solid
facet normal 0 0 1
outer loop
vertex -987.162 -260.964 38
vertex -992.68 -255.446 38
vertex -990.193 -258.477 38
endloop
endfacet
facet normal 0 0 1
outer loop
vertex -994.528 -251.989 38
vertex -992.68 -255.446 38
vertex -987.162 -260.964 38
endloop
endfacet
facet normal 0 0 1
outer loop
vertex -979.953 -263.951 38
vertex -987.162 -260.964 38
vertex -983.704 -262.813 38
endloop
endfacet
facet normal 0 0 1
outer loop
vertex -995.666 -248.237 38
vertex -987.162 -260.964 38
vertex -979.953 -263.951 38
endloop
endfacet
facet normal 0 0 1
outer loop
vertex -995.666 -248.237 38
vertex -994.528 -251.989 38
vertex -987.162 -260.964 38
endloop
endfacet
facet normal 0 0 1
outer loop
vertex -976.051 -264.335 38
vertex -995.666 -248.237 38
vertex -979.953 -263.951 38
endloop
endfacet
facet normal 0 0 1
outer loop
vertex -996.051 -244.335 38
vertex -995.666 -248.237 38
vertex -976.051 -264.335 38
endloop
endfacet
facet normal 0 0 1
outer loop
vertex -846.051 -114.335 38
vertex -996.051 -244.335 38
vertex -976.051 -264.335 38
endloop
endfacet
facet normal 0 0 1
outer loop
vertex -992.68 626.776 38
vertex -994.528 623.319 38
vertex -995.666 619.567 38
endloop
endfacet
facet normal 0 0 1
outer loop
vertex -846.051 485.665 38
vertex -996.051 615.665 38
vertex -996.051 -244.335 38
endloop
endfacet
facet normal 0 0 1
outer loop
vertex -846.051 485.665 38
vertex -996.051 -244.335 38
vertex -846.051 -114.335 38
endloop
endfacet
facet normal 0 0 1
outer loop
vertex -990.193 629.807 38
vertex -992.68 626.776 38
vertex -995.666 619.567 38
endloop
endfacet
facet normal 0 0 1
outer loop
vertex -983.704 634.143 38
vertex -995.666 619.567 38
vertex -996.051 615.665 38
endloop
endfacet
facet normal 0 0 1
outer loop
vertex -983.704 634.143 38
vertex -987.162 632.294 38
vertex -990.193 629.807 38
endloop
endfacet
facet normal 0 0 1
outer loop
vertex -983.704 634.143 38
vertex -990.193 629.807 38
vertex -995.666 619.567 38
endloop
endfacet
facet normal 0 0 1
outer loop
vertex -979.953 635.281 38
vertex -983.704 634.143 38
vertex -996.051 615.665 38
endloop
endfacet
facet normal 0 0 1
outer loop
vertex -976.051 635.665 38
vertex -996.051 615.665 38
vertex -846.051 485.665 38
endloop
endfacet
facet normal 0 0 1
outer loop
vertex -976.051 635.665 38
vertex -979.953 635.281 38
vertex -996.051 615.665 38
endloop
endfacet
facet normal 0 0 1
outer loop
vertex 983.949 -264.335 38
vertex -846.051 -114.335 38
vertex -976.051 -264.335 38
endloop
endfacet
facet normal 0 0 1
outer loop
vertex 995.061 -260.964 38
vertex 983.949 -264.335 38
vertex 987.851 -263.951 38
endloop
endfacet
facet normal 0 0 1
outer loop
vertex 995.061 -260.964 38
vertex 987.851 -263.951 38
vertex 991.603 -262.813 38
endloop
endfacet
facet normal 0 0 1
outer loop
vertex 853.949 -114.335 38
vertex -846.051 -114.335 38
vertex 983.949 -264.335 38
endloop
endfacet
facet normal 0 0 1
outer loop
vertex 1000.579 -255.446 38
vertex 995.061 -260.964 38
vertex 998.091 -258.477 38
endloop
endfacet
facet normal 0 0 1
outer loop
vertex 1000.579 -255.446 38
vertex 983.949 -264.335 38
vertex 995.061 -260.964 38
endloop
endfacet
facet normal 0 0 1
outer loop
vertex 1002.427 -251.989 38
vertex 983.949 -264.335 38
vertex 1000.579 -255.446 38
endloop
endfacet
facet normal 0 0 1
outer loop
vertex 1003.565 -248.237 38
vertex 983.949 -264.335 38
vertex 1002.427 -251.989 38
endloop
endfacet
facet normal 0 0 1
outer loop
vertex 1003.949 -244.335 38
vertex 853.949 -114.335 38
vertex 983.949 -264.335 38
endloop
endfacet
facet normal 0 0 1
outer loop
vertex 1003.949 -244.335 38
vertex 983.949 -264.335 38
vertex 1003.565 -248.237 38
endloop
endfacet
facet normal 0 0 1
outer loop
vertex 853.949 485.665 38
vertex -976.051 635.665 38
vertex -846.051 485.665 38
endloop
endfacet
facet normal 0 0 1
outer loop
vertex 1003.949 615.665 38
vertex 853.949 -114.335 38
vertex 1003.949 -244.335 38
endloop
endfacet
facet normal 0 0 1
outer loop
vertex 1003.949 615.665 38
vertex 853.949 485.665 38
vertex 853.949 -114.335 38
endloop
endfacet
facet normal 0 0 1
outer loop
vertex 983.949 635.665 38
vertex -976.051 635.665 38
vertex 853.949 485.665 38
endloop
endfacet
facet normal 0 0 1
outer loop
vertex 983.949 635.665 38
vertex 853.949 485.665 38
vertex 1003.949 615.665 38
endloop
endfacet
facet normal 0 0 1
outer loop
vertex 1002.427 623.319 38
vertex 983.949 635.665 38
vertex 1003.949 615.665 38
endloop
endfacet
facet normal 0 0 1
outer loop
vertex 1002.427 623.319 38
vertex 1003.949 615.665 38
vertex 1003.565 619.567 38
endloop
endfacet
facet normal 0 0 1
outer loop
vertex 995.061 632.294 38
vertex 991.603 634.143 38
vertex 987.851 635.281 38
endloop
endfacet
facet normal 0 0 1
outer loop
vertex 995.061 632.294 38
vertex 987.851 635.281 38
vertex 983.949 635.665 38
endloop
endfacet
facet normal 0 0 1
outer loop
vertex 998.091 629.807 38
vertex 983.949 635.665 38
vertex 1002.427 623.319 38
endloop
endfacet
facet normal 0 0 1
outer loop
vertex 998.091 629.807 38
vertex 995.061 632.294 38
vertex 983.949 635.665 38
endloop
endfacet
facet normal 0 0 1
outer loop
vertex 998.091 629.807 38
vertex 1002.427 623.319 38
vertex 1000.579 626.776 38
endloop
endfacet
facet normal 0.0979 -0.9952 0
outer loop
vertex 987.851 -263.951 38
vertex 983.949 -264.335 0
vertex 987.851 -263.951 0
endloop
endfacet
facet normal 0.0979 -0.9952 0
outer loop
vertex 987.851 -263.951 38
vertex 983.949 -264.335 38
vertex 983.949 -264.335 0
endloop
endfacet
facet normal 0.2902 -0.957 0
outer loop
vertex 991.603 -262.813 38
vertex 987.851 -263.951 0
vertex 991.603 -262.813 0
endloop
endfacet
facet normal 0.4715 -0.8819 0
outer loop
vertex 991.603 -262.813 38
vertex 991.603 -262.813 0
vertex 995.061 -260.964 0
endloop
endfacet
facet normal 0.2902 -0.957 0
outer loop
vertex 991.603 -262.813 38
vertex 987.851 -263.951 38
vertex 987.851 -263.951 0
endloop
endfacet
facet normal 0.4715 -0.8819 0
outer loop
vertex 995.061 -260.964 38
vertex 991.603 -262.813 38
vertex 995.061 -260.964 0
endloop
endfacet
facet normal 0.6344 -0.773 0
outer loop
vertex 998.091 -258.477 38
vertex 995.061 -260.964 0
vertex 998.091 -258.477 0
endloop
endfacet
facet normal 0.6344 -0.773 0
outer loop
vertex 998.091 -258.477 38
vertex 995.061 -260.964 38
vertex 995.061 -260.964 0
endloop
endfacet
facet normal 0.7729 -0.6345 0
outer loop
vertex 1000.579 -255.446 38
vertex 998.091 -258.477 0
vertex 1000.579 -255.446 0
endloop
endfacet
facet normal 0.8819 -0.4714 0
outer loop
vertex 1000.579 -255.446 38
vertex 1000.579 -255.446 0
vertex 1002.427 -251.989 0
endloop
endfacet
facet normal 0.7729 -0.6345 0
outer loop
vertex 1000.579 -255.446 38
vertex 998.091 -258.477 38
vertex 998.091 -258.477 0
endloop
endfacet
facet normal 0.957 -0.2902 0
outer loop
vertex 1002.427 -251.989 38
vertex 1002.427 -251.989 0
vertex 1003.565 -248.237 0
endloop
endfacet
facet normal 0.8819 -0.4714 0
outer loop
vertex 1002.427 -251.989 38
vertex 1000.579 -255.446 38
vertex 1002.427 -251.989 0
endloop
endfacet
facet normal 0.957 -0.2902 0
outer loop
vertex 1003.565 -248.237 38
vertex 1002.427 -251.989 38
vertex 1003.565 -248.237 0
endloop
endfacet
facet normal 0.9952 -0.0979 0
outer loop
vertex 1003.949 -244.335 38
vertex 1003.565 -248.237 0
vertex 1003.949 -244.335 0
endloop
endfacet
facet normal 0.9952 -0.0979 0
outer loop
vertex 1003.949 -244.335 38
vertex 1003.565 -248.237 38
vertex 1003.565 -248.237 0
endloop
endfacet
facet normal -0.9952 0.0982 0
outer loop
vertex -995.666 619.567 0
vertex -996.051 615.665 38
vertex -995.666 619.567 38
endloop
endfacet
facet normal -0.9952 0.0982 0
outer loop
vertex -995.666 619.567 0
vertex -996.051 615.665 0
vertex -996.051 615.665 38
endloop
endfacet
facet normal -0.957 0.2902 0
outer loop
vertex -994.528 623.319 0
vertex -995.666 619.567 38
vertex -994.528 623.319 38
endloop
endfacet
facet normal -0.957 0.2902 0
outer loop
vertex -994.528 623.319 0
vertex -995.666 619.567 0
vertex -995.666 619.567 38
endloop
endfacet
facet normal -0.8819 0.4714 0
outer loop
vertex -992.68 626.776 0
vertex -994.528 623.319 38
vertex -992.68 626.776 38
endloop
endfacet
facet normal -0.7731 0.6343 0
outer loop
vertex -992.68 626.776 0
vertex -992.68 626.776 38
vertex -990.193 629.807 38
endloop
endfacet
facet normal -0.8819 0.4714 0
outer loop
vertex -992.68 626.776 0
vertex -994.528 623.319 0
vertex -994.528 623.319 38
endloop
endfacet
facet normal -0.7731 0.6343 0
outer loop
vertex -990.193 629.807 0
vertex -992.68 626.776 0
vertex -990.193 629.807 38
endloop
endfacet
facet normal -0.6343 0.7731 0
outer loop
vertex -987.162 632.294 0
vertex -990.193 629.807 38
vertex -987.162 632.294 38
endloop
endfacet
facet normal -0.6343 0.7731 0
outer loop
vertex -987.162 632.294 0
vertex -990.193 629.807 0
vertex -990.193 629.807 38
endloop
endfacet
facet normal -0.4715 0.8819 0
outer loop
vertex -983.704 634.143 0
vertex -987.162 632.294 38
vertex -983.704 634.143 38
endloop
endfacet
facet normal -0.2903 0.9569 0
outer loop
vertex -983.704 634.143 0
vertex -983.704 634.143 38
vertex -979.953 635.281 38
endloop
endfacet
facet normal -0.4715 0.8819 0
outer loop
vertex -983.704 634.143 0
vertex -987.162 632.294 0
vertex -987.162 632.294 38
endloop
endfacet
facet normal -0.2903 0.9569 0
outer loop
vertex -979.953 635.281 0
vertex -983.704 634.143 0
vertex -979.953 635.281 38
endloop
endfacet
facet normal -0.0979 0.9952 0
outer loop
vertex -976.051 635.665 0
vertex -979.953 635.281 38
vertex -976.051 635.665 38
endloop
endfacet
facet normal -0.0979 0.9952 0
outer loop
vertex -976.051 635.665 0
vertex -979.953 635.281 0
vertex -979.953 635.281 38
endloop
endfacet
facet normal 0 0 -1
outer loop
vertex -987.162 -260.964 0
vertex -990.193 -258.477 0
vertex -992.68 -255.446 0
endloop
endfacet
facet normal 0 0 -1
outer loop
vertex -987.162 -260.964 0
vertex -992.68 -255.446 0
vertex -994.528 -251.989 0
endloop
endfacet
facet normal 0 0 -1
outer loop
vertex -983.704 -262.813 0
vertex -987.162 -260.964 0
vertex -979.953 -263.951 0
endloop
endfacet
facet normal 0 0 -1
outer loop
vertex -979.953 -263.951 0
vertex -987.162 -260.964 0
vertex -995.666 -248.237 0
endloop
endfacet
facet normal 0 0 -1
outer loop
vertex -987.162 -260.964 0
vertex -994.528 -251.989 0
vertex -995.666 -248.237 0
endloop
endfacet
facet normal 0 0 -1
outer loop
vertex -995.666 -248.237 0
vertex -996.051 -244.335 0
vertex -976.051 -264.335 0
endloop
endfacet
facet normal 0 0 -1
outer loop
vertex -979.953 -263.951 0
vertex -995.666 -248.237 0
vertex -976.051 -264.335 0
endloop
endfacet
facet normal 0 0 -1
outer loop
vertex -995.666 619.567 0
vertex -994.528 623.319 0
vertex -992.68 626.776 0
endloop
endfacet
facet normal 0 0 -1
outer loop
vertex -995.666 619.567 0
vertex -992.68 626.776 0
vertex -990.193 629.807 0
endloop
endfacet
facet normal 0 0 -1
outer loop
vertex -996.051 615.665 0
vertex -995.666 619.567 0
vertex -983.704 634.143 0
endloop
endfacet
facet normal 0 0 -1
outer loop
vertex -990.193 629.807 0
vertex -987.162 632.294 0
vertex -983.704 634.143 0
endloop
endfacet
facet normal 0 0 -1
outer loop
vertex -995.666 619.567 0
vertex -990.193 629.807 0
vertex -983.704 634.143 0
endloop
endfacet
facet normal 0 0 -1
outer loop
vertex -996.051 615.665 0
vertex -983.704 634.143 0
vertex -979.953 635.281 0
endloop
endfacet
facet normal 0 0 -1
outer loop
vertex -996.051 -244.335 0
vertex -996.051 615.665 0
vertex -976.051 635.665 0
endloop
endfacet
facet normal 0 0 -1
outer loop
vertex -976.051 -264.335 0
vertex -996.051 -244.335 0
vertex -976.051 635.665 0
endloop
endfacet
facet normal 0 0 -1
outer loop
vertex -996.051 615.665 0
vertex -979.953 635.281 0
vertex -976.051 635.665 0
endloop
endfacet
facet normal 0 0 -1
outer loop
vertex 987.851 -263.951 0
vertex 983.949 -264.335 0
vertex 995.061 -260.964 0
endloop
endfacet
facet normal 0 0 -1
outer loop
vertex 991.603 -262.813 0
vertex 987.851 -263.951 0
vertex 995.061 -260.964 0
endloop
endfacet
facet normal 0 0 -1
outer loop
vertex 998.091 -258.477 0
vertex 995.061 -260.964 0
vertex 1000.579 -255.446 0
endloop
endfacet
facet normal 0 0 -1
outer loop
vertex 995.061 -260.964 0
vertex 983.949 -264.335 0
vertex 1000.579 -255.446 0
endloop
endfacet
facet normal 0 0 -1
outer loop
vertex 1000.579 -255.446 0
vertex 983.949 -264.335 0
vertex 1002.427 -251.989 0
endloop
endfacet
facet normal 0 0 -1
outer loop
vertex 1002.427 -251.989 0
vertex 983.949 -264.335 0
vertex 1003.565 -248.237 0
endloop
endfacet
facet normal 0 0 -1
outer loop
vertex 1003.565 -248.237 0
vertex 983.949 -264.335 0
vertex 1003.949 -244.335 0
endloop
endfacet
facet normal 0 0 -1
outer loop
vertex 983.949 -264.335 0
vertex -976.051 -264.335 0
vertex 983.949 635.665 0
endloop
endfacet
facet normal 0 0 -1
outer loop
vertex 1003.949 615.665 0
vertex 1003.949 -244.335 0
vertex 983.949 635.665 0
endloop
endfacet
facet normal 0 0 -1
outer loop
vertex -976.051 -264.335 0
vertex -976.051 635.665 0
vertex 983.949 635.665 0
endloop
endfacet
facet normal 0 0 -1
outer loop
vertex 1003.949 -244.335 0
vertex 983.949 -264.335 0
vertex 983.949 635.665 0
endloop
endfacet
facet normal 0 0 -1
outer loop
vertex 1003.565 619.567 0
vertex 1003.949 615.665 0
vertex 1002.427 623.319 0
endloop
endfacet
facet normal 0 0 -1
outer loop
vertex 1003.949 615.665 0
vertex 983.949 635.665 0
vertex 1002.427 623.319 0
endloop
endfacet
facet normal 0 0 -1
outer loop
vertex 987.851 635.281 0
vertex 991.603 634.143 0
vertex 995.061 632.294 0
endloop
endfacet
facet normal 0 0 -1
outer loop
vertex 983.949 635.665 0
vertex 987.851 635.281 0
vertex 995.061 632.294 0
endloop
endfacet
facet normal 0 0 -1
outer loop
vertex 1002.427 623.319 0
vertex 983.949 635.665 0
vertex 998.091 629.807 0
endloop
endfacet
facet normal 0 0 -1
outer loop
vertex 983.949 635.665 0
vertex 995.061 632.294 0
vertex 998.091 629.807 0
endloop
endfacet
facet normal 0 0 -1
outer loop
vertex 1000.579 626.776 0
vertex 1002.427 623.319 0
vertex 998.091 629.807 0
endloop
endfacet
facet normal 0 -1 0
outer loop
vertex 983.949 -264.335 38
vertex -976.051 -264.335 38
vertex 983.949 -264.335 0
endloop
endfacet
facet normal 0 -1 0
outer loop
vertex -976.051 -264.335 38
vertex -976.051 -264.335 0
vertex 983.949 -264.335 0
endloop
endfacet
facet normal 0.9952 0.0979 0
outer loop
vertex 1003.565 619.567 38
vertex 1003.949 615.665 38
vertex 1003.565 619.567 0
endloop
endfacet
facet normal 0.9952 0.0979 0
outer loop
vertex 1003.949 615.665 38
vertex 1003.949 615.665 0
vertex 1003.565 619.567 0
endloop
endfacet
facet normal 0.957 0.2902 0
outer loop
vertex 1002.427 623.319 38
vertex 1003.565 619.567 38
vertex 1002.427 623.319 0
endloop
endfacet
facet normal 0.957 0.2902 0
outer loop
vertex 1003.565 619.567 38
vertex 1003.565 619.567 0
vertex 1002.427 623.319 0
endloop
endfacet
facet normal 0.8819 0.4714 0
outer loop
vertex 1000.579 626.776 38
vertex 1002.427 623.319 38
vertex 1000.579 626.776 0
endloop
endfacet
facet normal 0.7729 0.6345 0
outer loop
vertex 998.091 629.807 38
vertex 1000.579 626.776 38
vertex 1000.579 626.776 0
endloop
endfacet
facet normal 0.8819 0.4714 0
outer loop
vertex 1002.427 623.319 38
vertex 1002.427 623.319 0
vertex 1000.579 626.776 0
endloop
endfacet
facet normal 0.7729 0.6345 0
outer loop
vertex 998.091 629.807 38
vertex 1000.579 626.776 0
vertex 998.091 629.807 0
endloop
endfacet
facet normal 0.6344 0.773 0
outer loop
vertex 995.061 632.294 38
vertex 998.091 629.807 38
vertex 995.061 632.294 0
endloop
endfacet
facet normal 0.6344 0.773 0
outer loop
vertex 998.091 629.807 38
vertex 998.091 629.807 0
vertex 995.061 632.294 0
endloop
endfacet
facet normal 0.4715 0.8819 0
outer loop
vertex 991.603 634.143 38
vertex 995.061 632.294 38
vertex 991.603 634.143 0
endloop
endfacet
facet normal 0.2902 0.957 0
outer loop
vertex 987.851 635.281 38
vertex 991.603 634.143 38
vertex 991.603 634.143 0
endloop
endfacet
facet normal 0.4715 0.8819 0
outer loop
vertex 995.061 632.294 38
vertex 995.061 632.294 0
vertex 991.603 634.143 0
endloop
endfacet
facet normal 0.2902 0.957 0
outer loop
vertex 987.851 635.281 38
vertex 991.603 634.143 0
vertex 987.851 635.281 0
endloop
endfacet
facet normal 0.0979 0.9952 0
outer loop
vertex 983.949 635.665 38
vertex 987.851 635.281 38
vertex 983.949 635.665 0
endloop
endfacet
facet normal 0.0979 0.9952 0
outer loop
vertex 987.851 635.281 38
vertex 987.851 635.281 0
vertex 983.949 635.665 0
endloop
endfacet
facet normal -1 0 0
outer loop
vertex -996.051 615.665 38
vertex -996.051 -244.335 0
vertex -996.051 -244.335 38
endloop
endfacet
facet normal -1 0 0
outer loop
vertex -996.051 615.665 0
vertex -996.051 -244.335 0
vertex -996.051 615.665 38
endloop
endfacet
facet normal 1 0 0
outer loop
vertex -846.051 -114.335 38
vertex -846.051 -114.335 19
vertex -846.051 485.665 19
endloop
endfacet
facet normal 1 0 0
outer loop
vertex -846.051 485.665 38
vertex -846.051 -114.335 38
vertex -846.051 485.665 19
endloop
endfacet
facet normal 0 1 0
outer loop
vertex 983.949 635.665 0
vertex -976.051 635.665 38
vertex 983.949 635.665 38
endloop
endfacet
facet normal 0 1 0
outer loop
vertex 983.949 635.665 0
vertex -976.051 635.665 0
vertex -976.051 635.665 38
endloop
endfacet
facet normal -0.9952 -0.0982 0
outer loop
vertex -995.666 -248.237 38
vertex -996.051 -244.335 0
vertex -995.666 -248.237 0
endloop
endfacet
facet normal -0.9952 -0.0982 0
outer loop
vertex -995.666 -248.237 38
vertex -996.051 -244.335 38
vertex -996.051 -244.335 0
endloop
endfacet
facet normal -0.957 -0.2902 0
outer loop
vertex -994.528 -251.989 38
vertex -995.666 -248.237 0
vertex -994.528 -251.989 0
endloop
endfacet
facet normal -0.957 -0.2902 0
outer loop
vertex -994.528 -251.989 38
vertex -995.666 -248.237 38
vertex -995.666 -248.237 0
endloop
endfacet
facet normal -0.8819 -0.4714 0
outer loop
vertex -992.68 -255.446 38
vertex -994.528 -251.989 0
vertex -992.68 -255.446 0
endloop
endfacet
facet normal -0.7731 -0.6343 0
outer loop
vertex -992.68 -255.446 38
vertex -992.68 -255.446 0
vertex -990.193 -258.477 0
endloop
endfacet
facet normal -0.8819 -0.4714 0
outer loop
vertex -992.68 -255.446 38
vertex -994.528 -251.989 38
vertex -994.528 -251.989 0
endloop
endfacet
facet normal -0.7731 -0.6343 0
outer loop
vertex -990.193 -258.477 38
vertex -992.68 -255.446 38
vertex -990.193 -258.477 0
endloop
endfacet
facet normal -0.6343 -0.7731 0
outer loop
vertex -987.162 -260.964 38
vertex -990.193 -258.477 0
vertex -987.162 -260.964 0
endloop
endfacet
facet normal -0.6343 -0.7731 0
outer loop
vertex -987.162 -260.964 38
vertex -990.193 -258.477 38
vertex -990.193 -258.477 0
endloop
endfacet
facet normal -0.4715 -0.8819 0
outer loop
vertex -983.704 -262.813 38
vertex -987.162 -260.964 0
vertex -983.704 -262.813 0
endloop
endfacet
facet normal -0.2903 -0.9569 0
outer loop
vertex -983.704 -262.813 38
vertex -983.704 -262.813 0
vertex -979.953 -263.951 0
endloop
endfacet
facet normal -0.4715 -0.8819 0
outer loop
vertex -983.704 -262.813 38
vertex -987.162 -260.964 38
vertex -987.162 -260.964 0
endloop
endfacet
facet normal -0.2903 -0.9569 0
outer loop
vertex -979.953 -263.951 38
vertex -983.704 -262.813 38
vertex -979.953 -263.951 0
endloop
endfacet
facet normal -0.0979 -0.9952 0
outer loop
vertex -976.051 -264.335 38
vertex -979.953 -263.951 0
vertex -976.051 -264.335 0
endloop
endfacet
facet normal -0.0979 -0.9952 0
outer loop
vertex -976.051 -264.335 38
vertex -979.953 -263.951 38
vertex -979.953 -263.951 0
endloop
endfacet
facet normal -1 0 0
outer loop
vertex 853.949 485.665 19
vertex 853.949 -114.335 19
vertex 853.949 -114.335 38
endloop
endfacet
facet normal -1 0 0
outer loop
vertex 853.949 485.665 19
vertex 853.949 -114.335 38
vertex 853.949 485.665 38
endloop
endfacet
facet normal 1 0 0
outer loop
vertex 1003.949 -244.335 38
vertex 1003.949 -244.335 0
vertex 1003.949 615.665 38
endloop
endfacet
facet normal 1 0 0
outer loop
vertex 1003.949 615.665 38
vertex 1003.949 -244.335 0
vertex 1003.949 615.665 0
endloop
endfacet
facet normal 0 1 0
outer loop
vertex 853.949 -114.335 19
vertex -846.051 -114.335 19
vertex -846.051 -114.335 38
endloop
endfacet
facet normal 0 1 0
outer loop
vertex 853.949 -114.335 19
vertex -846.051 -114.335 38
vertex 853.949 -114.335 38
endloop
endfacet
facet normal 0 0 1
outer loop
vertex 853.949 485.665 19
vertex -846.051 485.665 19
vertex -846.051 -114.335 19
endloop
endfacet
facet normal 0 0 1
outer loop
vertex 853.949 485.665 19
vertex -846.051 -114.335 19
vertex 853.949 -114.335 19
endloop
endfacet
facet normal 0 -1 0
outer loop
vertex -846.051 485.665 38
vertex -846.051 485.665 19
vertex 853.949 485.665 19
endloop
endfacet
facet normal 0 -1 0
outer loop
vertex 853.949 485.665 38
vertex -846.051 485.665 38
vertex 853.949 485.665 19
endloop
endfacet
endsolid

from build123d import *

# Parameters (mm, degrees)
F0_W     = 2000
F0_H     = 900
F1_DEPTH = 19
F2_W     = 2000
F2_H     = 900
F2_W_2   = 1700
F2_H_2   = 600
F3_DEPTH = 19
F4_R     = 20


with BuildPart() as f1:
    # F0 (on Top) → F1 (new body)
    with BuildSketch(Plane.XY):
        with Locations((3.94921, 185.664962)):
            Rectangle(F0_W, F0_H)
    extrude(amount=F1_DEPTH)

    # F2 (on face) → F3 (join)
    with BuildSketch(Plane.XY.offset(19)):
        with Locations((3.94921, 185.664962)):
            Rectangle(F2_W, F2_H)
        with Locations((3.94921, 185.664962)):
            Rectangle(F2_W_2, F2_H_2, mode=Mode.SUBTRACT)
    extrude(amount=F3_DEPTH)

    # F4
    f4_edges = [f1.edges().sort_by_distance(p)[0] for p in [
        (1003.94921, -264.335038, 19),
        (1003.94921, 635.664962, 19),
        (-996.05079, -264.335038, 19),
        (-996.05079, 635.664962, 19),
    ]]
    fillet(f4_edges, radius=F4_R)


solid = f1.part
